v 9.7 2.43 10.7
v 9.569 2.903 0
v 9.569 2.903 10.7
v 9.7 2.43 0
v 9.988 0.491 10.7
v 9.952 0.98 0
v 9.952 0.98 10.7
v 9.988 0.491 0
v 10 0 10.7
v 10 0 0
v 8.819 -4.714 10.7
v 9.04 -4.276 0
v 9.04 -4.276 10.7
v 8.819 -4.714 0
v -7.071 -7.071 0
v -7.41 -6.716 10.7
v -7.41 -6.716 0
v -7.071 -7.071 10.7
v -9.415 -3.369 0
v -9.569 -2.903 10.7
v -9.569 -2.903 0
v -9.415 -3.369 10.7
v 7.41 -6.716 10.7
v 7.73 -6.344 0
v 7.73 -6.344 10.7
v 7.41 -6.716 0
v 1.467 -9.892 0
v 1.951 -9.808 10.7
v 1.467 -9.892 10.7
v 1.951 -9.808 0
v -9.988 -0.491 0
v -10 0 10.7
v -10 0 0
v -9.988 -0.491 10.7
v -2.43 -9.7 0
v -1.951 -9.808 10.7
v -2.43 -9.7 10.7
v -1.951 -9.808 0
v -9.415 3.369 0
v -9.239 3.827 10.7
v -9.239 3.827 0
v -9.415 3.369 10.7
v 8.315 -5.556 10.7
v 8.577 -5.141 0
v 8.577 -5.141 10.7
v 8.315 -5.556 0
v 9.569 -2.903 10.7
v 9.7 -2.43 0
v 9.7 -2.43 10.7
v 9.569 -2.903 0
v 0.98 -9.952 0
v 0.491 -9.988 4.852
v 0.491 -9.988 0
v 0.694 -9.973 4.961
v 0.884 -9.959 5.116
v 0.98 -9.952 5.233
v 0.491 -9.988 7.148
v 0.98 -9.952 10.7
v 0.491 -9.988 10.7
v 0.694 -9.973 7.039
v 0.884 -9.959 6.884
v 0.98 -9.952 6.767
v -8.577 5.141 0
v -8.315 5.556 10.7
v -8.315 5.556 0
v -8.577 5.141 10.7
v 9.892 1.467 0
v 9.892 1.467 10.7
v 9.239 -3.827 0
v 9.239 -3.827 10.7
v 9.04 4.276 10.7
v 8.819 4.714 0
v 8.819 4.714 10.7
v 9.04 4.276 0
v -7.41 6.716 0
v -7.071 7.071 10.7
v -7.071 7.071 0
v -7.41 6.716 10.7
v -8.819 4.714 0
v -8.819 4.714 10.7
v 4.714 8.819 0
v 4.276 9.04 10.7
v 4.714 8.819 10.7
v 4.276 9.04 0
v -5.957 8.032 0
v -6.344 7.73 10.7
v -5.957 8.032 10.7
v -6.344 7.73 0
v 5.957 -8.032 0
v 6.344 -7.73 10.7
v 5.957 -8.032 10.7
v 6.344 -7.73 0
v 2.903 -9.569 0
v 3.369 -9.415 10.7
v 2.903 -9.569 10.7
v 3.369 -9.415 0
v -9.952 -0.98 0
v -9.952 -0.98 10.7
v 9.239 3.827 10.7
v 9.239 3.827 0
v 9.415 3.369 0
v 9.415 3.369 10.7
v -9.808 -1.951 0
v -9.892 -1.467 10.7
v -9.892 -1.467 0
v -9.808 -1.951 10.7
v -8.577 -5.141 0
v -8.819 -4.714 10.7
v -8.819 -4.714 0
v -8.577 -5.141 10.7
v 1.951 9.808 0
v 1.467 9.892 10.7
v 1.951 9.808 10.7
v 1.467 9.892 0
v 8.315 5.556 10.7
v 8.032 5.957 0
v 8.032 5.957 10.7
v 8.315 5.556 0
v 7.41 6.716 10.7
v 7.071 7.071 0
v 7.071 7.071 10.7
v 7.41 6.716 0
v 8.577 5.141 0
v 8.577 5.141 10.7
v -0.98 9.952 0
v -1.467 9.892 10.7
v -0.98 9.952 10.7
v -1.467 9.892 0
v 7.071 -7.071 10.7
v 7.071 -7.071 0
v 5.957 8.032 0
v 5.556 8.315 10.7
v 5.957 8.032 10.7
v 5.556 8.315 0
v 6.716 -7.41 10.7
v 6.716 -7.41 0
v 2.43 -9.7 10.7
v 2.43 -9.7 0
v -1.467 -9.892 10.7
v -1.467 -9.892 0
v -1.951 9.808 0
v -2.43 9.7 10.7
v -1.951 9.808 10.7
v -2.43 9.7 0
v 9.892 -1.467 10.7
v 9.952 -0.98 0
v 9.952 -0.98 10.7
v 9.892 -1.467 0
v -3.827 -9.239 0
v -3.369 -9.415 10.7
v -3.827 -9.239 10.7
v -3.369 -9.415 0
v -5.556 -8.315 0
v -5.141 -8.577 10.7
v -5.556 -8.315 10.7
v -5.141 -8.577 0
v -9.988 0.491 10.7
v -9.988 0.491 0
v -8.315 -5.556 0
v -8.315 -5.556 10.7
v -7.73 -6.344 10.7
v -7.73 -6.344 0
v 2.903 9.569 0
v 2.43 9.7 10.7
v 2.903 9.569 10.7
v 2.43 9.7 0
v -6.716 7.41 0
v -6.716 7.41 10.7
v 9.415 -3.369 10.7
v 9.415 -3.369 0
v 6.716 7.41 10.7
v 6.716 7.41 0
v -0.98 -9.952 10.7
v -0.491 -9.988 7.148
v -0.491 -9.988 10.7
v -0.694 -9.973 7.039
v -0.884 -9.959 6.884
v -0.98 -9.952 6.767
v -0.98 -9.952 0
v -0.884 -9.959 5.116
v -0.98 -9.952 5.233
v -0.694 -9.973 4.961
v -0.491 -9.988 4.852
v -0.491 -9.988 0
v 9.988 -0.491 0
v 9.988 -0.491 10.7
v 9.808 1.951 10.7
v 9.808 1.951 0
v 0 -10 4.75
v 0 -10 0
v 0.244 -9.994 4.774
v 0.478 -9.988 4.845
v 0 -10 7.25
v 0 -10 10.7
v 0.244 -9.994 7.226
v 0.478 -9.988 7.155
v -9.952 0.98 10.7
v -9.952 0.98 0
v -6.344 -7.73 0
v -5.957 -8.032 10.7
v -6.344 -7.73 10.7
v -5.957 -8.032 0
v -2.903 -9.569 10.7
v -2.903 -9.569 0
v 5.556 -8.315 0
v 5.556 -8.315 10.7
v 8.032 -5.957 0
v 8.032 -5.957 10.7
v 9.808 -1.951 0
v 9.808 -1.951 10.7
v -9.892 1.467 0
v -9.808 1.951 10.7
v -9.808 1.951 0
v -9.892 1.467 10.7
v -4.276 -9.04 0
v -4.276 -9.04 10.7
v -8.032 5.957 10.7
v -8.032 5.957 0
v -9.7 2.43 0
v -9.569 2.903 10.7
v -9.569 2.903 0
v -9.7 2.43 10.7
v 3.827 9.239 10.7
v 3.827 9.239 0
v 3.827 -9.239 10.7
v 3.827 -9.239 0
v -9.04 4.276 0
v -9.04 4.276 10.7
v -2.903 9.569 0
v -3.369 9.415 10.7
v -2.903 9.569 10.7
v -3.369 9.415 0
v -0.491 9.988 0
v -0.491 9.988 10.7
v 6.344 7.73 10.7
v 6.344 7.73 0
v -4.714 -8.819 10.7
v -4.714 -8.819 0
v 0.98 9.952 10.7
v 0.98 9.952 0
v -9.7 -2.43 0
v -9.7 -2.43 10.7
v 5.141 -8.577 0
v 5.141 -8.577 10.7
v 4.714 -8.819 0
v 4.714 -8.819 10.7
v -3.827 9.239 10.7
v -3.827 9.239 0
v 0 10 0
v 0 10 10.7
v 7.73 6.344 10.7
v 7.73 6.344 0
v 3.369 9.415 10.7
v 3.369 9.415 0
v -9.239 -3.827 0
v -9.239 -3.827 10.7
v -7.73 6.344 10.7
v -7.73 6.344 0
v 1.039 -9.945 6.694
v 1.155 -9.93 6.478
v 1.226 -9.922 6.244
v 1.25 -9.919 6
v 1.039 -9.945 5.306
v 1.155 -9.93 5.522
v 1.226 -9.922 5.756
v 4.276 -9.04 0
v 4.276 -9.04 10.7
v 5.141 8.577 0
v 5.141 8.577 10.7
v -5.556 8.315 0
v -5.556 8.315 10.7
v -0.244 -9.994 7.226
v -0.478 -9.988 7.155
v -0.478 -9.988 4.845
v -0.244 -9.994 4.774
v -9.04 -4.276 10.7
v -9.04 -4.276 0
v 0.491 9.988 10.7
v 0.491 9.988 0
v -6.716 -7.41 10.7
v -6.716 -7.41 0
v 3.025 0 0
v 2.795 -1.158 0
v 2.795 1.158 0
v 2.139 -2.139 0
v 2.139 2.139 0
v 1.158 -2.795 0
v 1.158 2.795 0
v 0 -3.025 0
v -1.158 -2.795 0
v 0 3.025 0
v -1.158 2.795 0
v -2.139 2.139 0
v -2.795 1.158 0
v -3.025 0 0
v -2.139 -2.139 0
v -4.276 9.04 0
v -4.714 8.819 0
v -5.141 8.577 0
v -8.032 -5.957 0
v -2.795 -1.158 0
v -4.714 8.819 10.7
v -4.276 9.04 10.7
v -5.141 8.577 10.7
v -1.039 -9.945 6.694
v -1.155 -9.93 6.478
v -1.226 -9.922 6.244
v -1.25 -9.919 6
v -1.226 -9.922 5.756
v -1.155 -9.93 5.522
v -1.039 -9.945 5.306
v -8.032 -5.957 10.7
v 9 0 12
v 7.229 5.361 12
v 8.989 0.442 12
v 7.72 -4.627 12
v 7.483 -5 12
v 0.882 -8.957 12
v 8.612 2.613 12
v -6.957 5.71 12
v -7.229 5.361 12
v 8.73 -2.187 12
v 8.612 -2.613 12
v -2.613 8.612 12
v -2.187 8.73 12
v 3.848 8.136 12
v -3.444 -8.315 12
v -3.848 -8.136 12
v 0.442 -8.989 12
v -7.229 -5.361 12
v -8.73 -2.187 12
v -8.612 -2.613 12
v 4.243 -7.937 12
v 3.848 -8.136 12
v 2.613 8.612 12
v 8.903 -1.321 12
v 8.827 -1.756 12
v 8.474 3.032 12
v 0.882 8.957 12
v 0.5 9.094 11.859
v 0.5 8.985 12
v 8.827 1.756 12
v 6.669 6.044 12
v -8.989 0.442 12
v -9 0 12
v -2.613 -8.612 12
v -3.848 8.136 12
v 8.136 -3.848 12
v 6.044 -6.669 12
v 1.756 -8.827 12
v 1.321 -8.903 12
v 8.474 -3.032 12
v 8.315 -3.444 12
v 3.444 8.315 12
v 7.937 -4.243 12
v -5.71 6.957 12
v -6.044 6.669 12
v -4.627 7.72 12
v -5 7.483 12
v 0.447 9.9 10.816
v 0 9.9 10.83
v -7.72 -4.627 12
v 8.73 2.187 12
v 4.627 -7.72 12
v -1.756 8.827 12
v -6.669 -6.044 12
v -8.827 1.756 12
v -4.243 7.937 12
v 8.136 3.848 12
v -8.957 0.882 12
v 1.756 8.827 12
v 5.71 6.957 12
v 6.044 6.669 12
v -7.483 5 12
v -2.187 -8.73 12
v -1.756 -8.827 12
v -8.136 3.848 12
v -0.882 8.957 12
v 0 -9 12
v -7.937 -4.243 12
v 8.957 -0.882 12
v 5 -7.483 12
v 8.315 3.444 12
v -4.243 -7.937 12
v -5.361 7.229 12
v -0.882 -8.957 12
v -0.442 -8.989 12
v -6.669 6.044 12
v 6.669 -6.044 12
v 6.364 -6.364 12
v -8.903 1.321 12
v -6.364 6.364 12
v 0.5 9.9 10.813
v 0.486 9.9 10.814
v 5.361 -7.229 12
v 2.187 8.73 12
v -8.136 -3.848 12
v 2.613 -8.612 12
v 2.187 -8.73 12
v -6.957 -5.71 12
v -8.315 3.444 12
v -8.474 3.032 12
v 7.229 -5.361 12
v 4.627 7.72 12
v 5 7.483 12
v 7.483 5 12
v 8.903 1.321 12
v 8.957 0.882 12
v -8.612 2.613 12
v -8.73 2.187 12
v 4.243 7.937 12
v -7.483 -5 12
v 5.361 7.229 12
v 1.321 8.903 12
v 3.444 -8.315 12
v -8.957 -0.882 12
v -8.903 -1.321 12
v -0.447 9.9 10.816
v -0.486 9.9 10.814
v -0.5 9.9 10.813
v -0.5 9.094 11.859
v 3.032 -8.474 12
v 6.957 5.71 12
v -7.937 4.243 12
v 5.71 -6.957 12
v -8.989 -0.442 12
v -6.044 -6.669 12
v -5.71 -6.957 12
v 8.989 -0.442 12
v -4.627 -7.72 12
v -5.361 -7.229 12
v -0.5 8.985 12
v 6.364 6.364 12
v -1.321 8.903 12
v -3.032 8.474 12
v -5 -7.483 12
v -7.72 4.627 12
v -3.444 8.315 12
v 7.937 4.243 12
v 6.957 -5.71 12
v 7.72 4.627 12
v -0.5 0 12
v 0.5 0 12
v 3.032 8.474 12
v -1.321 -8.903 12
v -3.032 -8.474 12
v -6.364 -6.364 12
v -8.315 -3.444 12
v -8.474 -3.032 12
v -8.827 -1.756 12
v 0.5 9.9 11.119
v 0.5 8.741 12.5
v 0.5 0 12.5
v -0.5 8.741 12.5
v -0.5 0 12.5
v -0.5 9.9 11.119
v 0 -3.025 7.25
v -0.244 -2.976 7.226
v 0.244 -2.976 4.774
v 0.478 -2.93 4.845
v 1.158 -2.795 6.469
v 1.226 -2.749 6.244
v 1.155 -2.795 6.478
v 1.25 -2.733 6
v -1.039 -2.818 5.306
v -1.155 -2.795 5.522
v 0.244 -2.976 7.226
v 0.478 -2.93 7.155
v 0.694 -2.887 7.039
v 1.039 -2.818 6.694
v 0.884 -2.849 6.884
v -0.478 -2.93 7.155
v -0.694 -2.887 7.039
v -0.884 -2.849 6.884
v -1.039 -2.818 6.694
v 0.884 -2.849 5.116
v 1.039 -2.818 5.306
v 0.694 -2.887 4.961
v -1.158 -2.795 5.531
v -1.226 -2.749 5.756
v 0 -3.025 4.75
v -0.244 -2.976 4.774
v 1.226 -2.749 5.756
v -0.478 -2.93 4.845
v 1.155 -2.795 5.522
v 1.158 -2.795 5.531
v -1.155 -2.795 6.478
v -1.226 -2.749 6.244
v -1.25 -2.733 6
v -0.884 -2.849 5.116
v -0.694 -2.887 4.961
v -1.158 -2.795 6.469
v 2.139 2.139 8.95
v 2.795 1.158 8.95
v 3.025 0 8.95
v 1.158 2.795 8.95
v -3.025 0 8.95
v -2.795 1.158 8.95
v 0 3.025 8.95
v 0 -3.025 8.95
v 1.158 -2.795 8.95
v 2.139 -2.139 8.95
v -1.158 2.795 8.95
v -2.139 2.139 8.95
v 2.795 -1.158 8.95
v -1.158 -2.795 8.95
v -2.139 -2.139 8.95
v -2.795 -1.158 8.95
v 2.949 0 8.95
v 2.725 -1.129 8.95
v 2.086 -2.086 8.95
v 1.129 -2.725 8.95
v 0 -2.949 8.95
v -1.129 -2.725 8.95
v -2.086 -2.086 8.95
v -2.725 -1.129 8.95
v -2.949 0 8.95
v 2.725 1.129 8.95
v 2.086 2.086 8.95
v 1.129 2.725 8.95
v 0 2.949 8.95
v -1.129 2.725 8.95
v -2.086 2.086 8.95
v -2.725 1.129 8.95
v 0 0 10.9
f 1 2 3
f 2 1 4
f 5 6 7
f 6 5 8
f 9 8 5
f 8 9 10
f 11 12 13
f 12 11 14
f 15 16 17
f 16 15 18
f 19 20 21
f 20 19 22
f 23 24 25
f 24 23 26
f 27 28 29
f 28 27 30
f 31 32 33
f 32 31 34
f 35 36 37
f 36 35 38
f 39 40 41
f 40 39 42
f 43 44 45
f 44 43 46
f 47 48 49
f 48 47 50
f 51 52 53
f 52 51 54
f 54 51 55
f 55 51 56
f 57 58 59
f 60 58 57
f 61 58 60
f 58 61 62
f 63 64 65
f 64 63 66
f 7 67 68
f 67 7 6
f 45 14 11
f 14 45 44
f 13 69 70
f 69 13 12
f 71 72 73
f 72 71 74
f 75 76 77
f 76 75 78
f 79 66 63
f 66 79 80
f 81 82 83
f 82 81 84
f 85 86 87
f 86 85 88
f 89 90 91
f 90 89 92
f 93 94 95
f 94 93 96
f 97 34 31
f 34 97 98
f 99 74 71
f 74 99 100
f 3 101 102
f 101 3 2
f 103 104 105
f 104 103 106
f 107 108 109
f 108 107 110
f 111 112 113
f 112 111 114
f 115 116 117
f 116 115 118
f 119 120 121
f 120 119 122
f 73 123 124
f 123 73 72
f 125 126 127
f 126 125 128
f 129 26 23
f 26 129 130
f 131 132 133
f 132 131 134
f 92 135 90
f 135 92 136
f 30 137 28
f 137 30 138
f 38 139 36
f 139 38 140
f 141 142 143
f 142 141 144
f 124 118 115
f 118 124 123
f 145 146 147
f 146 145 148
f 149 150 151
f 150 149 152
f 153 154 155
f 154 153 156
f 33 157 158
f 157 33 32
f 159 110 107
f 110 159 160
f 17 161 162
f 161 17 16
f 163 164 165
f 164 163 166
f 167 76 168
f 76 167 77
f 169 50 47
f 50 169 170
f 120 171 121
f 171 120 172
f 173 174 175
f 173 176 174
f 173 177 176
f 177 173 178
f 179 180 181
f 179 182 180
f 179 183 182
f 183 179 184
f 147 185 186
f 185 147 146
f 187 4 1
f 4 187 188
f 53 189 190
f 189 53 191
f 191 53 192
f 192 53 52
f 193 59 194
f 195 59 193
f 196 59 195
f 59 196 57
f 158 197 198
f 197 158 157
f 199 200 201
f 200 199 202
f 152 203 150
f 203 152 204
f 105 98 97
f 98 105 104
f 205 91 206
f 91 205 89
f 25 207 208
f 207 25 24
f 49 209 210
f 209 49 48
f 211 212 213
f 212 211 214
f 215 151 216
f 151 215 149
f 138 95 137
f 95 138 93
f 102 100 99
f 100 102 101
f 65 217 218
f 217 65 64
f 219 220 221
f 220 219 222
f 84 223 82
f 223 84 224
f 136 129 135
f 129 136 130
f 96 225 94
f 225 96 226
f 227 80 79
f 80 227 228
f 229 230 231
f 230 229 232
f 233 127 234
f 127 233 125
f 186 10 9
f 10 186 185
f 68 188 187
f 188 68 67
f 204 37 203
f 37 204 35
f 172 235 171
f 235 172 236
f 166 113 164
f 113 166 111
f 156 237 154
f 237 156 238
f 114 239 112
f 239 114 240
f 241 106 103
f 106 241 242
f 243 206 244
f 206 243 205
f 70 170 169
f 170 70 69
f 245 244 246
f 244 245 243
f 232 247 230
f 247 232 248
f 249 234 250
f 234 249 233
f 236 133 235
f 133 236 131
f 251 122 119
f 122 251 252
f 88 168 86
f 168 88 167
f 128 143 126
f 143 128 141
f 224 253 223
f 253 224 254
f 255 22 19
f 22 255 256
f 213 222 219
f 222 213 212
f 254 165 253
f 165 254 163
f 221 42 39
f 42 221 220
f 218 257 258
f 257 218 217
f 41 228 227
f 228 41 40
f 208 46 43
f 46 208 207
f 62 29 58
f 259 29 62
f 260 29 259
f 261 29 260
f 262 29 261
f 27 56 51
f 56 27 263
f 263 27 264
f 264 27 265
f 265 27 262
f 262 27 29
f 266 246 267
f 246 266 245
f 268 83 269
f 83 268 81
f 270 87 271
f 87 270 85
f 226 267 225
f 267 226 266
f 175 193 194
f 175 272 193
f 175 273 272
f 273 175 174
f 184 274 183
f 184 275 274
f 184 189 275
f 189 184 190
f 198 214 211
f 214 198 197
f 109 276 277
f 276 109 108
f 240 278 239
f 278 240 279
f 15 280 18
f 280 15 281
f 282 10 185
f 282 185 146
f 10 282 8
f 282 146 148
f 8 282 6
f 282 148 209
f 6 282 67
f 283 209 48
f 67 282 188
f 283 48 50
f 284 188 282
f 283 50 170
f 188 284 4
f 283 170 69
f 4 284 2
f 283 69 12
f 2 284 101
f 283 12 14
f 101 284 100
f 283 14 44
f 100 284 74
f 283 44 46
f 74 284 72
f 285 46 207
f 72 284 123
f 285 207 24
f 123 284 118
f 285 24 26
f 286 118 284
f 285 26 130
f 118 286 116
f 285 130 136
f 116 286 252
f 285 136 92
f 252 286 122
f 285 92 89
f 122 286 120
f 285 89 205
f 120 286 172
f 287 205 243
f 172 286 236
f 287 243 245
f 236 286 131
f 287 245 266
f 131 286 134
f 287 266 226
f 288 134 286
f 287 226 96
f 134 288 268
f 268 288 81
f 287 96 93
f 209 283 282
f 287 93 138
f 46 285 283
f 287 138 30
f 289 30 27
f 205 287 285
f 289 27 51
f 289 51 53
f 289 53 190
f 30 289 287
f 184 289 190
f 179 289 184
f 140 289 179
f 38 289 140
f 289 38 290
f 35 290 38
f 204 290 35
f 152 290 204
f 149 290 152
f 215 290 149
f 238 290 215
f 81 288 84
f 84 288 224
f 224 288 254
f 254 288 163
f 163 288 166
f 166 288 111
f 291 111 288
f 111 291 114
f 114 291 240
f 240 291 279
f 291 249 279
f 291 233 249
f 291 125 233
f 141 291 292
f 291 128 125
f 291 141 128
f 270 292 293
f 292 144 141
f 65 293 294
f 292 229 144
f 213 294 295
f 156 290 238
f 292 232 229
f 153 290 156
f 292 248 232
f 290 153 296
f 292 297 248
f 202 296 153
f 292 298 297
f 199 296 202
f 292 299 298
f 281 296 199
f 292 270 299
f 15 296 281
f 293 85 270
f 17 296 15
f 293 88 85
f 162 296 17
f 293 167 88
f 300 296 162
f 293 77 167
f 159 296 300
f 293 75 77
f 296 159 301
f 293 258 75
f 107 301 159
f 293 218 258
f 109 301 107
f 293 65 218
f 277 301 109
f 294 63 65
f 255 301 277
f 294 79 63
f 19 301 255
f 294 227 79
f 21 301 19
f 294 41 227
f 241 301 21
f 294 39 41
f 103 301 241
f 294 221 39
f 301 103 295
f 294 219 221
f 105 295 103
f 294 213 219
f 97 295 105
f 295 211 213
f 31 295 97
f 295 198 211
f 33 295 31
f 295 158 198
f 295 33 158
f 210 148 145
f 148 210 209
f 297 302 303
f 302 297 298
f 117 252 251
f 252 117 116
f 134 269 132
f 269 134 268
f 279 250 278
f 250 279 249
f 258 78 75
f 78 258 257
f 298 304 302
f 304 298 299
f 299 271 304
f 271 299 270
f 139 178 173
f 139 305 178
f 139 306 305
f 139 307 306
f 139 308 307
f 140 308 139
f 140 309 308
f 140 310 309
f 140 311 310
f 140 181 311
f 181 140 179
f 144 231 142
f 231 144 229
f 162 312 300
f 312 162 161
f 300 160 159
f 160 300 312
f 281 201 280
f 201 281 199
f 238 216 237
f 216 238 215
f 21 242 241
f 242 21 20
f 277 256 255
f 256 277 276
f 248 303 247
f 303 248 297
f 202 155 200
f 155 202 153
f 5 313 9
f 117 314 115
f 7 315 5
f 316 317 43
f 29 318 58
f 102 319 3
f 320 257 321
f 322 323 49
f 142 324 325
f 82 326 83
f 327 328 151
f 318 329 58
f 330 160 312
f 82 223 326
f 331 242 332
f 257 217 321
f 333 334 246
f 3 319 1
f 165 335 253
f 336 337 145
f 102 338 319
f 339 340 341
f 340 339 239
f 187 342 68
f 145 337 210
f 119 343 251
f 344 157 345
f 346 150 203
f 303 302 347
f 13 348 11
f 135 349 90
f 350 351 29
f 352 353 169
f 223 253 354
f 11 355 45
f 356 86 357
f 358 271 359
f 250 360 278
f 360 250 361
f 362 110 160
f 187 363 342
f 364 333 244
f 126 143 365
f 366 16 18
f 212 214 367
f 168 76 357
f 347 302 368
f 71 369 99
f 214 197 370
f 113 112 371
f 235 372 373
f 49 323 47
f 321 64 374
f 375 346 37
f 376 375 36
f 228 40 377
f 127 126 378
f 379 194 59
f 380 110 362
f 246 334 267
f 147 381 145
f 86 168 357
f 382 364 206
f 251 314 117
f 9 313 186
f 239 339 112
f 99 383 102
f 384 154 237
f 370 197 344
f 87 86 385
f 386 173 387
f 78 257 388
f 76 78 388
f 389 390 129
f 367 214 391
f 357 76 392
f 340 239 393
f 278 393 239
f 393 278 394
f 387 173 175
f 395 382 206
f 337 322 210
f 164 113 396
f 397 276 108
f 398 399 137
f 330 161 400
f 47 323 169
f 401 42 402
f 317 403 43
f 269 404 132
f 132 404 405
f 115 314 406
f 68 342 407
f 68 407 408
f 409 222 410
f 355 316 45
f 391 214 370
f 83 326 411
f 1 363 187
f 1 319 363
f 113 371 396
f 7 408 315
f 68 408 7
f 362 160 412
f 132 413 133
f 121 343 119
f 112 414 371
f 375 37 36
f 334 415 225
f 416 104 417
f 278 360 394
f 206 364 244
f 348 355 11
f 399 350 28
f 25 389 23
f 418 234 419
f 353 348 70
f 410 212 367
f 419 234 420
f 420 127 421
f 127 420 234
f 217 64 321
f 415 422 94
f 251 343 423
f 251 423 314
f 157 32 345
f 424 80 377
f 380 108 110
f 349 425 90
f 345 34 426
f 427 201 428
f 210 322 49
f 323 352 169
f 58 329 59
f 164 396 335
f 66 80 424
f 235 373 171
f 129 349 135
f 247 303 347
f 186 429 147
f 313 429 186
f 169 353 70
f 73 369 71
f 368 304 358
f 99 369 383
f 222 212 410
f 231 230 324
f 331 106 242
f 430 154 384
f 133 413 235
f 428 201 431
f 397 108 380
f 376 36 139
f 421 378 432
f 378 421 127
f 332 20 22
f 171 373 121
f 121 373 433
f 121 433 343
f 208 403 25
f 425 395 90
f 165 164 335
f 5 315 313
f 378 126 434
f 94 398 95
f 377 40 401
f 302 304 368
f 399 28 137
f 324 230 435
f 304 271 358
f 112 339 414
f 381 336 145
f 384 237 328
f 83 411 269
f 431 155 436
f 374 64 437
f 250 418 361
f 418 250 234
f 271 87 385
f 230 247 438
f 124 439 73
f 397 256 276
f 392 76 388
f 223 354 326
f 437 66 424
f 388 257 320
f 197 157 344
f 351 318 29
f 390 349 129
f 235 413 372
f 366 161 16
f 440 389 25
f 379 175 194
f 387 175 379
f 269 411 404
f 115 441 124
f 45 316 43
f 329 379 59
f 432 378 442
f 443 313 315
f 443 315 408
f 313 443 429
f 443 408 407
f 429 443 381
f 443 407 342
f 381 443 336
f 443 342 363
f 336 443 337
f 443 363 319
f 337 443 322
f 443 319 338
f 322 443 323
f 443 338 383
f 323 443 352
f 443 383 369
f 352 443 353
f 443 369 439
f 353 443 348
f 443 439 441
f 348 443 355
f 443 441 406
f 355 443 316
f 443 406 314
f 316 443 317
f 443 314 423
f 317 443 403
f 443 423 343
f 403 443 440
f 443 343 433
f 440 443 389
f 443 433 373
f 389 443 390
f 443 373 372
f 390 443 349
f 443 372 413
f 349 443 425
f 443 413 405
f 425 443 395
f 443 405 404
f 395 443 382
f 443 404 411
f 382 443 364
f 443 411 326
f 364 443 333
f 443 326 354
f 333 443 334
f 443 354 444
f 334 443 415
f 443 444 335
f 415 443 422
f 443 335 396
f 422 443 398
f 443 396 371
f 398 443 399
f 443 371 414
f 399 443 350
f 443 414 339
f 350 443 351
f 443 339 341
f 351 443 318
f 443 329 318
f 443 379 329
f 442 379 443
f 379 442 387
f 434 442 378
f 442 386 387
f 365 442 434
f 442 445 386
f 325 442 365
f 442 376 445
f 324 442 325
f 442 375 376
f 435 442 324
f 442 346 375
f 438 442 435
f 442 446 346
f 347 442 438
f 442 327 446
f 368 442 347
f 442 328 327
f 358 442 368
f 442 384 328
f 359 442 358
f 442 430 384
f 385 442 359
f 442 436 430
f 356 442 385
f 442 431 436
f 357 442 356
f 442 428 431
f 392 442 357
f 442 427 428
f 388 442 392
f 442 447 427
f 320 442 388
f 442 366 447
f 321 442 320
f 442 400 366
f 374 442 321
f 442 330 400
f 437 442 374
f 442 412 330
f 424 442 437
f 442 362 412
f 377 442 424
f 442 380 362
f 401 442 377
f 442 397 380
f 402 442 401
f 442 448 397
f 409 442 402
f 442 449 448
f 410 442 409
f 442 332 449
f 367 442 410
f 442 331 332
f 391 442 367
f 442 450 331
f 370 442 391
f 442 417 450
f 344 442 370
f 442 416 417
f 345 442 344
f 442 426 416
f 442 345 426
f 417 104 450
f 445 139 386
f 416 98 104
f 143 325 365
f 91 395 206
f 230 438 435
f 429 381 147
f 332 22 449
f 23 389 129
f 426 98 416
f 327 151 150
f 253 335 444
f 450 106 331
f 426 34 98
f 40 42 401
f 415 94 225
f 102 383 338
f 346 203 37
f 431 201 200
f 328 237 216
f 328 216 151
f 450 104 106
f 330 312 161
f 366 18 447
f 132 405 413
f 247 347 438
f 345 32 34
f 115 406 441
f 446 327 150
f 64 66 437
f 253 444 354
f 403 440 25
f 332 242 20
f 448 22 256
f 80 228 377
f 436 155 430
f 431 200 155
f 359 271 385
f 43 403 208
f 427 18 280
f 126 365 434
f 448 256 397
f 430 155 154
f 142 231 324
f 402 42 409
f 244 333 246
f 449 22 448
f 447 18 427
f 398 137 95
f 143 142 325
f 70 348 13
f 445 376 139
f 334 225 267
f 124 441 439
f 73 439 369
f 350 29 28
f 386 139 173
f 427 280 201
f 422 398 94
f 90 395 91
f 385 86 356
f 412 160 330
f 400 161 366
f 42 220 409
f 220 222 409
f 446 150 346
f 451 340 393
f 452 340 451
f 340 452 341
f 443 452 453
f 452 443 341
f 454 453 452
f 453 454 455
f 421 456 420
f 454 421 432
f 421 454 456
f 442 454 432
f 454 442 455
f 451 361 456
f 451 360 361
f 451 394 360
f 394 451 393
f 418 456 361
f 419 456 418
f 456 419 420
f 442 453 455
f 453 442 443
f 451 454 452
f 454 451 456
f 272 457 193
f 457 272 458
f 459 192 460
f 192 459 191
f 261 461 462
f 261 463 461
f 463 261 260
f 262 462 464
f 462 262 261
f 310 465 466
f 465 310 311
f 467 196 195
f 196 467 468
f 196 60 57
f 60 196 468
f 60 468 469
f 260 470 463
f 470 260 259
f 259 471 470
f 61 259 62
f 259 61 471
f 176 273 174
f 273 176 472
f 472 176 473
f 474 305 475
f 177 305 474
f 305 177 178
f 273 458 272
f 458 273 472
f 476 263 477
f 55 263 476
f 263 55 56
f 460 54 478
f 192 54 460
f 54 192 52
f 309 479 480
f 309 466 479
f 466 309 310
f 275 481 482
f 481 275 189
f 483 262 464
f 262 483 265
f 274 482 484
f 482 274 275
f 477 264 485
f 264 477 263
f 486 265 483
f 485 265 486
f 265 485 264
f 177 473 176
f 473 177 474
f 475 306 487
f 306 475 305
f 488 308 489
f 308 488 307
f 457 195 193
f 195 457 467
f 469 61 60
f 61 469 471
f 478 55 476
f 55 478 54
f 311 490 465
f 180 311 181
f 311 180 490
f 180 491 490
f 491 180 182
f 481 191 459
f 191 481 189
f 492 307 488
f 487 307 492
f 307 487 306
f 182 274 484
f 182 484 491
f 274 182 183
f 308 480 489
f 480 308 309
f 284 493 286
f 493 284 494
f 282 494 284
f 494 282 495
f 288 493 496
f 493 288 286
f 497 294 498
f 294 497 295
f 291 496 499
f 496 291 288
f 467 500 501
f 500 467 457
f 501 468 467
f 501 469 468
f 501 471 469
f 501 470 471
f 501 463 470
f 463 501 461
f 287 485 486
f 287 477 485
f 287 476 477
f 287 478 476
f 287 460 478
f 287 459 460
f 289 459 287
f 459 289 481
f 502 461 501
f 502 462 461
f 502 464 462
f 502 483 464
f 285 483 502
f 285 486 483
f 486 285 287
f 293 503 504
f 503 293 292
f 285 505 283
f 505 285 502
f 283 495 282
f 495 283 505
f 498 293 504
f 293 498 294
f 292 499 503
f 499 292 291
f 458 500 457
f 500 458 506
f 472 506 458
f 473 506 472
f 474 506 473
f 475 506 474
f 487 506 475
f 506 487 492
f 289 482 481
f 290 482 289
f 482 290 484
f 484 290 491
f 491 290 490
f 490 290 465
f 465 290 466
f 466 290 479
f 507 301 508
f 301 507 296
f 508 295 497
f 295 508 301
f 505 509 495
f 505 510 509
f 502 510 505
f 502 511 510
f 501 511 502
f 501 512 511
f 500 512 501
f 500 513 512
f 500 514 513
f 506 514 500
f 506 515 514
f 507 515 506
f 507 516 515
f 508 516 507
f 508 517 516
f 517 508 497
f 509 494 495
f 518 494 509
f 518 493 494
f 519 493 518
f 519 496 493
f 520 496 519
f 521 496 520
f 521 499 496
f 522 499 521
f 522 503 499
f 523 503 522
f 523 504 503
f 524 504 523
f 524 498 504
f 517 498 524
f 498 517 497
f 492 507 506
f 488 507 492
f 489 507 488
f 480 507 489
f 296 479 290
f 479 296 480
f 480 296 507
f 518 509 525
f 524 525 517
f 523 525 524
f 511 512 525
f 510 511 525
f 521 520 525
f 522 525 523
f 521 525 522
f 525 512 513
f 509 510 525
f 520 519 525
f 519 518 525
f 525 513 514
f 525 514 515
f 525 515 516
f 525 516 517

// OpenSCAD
//OpenSCAD-Skript

//Moduldefinition mit Parametern für Frontplattensystem im 19mm-Raster
module PotiKnopf (
//Parameter
diami=6.05,   //Wellendurchmesser Poti
diama=20,    //Außendurchmesser Knopf
diams=2.5,   //Klemmschraubendurchmesser 
hght=12,     //Höhe Knopf
hghti=12.5,  //Höhe Indikator
wdthi=1      //Breite Indikator
)
//Beginn Modul
{
difference(){   //difference 1
union(){        //union 1
difference(){   //difference 2
union(){        //union 2
    //alles, was vor der nächsten geschweiften Klammer steht, wird zusammengefügt (union 2)
//Körper des Frontplattensegments
cylinder(d=diama,h=hght-1.3,$fn=128);
translate([0,0,hght-1.3]) cylinder(d1=diama,d2=diama-2,h=1.3,$fn=128);
 
//Indikator
translate([-wdthi/2,0,0]) cube([wdthi,diama/2-0.1,hghti]);

}               //union 2 end
    //alles, was vor der nächsten geschweiften Klammer steht, wird davon abgezogen (difference 2)
//Anschrägung Indikator
translate([-wdthi,diama/2,hght-1]) rotate([40,0,0]) cube([2*wdthi,5,5]);
//Bohrung Klemmschraube M3
rotate([90,0,0]) translate([0,hght/2,0]) cylinder(d=diams,h=15,$fn=32);
//Bohrung Achse
translate([0,0,-0.05]) cylinder(d=diami,h=hght-3,$fn=16);
translate([0,0,hght-3-0.1]) cylinder(d1=diami,d2=0,h=2,$fn=16);
}  //difference 2 end
    //alles, was vor der nächsten geschweiften Klammer steht, wird dazu hinzugefügt (union 1)

}               //union 1 end
    //alles, was vor der nächsten geschweiften Klammer steht, wird davon wieder abgezogen (difference 1)

}               //difference 1 end

}  //module end

//Hier werden Instanzen des Moduls aufgerufen
translate([0,0,0]) PotiKnopf();
